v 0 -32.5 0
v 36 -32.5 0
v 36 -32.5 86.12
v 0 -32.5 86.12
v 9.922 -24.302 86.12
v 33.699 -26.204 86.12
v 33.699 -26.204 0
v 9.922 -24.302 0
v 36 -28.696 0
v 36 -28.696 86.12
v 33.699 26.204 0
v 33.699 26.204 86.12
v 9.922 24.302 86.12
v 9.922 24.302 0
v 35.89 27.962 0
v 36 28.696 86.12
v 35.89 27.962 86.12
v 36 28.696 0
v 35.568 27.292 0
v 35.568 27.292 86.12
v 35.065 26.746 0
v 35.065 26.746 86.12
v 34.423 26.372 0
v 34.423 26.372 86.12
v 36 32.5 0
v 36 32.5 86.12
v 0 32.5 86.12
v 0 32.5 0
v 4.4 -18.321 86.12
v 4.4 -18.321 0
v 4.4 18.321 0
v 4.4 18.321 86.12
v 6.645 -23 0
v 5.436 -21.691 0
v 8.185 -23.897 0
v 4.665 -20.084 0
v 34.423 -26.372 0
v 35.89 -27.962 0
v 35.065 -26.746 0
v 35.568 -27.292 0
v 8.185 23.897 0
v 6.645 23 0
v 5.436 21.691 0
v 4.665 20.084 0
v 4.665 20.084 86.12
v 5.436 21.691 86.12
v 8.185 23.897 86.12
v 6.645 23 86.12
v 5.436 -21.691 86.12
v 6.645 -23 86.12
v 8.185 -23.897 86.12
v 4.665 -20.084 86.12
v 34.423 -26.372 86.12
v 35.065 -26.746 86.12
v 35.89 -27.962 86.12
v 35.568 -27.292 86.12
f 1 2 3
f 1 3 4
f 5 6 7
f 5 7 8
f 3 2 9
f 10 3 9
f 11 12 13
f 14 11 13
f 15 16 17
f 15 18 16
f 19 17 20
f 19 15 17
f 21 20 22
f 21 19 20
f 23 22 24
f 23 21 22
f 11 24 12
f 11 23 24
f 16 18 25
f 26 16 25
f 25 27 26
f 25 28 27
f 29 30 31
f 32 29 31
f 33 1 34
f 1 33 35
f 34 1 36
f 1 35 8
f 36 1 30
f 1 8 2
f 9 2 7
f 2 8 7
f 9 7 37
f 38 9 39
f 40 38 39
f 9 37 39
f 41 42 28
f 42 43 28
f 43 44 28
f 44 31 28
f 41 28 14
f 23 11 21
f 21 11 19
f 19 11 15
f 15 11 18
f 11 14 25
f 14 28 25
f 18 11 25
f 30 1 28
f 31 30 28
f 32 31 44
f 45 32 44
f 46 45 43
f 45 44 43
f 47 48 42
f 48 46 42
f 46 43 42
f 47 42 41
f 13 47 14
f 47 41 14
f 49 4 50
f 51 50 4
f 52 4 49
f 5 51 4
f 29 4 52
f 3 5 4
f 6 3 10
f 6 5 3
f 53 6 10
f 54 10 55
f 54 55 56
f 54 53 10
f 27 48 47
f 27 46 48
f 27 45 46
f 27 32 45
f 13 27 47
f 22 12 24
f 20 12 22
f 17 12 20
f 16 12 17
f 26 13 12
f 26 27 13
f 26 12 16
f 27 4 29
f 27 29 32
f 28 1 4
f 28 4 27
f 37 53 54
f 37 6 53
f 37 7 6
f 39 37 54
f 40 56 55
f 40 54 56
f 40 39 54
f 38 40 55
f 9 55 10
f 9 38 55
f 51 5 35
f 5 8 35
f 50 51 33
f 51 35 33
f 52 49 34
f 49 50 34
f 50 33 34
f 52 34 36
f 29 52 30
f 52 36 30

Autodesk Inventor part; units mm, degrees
ref_plane "Начальная плоскость" through (0, 0, 0) normal (0, 0, 1) x (1, 0, 0)
ref_plane "Конечная плоскость" through (0, 0, 86.12) normal (0, 0, 1) x (1, 0, 0)
sketch "Эскиз" plane through (0, 0, 0) normal (0, 0, 1) x (1, 0, 0)
  line L0 (36, -32.5) -> (0, -32.5)
  line L1 (36, -32.5) -> (36, -28.696)
  line L2 (33.6994, -26.2039) -> (9.9215, -24.3017)
  line L3 (4.4, -18.3208) -> (4.4, 18.3208)
  line L4 (33.6994, 26.2039) -> (9.9215, 24.3017)
  line L5 (36, 28.696) -> (36, 32.5)
  line L6 (0, 32.5) -> (36, 32.5)
  line L7 (0, -32.5) -> (0, 32.5)
  arc A0 (4.4, -18.3208) -> (9.9215, -24.3017) centre (10.4, -18.3208) ccw
  arc A1 (9.9215, 24.3017) -> (4.4, 18.3208) centre (10.4, 18.3208) ccw
  arc A2 (36, -28.696) -> (33.6994, -26.2039) centre (33.5, -28.696) ccw
  arc A3 (33.6994, 26.2039) -> (36, 28.696) centre (33.5, 28.696) ccw
  line L8 (0, 45.5) -> (0, -45.5) construction
  line L9 (-7.2974, 0) -> (43.7847, 0) construction
  point P0 (36, -26.388)
  point P1 (4.4, -23.86)
  point P2 (4.4, 23.86)
  point P3 (36, 26.388)
  dimension "d3" = 36
  dimension "d5" = 4.4
  dimension "d7" = 65
  dimension "d9" = 8.64
  dimension "d11" = 8.64
  dimension "d13" = 6.112
  dimension "d15" = 6.112
  dimension "d22" = 6
  dimension "d23" = 2.5
  dimension "d24" = 32.5
  dimension "d25" = 0
extrude "Тело" add sketch "Эскиз" along normal up to surface (86.12 mm away) from surface at 0
sketch "Sketch3" plane through (0, 0, 0) normal (0, 0, 1) x (1, 0, 0)
  line L0 (0, 0) -> (10, 0)
ref_plane "Work Plane7" through (0, 0, 0) normal (0, -1, 0) x (1, 0, 0)
sketch "Sketch4" plane through (0, 0, 0) normal (0, -1, 0) x (1, 0, 0)
  line L0 (-2, 0) -> (12, 0)
  line L1 (-2, 86.12) -> (12, 86.12)
  dimension "d29" = 86.12
ref_plane "РабПлоскость8" through (18, 177.5, 86.12) normal (0, 0, 1) x (1, 0, 0)
split "Разделение1" plane through (18, 177.5, 86.12) removes the side toward (0, 0, 1)
ref_plane "РабПлоскость9" through (546.459, 0, 0) normal (0, 0, -1) x (-1, 0, 0)
split "Разделение2" plane through (546.459, 0, 0) removes the side toward (0, 0, -1)
equation "\"d3\" = b"
equation "\"d5\" = t1"
equation "\"d7\" = ParH"
equation "\"d9\" = msp_x1 + t2"
equation "\"d11\" = msp_x1 + t2"
equation "\"d13\" = -msp_x2 + t2"
equation "\"d15\" = -msp_x2 + t2"
equation "\"d22\" = R"
equation "\"d23\" = R1"
equation "\"d24\" = 0.5 * d7"
equation "\"d16\" = G_L"
equation "\"R1\" = 2.5"
equation "\"R\" = 6"
equation "\"t1\" = 4.4"
equation "\"t2\" = 7.2"
equation "\"ParH\" = 65"
equation "\"b\" = 36"
equation "\"msp_x1\" = 0.04 * b"
equation "\"msp_x2\" = -0.08 * t1 + 0.04 * b"
equation "\"G_L\" = d29"
equation "\"ex\" = 0"
equation "\"G_OFFSET_START\" = 0"
equation "\"G_OFFSET_END\" = 0"
equation "\"d27\" = G_OFFSET_END + B_L"
equation "\"B_L\" = 86.12"
properties part number "Швеллер 6.5U-86,12 ГОСТ 8240-97" material "Сталь, мягкая, сварочная"
